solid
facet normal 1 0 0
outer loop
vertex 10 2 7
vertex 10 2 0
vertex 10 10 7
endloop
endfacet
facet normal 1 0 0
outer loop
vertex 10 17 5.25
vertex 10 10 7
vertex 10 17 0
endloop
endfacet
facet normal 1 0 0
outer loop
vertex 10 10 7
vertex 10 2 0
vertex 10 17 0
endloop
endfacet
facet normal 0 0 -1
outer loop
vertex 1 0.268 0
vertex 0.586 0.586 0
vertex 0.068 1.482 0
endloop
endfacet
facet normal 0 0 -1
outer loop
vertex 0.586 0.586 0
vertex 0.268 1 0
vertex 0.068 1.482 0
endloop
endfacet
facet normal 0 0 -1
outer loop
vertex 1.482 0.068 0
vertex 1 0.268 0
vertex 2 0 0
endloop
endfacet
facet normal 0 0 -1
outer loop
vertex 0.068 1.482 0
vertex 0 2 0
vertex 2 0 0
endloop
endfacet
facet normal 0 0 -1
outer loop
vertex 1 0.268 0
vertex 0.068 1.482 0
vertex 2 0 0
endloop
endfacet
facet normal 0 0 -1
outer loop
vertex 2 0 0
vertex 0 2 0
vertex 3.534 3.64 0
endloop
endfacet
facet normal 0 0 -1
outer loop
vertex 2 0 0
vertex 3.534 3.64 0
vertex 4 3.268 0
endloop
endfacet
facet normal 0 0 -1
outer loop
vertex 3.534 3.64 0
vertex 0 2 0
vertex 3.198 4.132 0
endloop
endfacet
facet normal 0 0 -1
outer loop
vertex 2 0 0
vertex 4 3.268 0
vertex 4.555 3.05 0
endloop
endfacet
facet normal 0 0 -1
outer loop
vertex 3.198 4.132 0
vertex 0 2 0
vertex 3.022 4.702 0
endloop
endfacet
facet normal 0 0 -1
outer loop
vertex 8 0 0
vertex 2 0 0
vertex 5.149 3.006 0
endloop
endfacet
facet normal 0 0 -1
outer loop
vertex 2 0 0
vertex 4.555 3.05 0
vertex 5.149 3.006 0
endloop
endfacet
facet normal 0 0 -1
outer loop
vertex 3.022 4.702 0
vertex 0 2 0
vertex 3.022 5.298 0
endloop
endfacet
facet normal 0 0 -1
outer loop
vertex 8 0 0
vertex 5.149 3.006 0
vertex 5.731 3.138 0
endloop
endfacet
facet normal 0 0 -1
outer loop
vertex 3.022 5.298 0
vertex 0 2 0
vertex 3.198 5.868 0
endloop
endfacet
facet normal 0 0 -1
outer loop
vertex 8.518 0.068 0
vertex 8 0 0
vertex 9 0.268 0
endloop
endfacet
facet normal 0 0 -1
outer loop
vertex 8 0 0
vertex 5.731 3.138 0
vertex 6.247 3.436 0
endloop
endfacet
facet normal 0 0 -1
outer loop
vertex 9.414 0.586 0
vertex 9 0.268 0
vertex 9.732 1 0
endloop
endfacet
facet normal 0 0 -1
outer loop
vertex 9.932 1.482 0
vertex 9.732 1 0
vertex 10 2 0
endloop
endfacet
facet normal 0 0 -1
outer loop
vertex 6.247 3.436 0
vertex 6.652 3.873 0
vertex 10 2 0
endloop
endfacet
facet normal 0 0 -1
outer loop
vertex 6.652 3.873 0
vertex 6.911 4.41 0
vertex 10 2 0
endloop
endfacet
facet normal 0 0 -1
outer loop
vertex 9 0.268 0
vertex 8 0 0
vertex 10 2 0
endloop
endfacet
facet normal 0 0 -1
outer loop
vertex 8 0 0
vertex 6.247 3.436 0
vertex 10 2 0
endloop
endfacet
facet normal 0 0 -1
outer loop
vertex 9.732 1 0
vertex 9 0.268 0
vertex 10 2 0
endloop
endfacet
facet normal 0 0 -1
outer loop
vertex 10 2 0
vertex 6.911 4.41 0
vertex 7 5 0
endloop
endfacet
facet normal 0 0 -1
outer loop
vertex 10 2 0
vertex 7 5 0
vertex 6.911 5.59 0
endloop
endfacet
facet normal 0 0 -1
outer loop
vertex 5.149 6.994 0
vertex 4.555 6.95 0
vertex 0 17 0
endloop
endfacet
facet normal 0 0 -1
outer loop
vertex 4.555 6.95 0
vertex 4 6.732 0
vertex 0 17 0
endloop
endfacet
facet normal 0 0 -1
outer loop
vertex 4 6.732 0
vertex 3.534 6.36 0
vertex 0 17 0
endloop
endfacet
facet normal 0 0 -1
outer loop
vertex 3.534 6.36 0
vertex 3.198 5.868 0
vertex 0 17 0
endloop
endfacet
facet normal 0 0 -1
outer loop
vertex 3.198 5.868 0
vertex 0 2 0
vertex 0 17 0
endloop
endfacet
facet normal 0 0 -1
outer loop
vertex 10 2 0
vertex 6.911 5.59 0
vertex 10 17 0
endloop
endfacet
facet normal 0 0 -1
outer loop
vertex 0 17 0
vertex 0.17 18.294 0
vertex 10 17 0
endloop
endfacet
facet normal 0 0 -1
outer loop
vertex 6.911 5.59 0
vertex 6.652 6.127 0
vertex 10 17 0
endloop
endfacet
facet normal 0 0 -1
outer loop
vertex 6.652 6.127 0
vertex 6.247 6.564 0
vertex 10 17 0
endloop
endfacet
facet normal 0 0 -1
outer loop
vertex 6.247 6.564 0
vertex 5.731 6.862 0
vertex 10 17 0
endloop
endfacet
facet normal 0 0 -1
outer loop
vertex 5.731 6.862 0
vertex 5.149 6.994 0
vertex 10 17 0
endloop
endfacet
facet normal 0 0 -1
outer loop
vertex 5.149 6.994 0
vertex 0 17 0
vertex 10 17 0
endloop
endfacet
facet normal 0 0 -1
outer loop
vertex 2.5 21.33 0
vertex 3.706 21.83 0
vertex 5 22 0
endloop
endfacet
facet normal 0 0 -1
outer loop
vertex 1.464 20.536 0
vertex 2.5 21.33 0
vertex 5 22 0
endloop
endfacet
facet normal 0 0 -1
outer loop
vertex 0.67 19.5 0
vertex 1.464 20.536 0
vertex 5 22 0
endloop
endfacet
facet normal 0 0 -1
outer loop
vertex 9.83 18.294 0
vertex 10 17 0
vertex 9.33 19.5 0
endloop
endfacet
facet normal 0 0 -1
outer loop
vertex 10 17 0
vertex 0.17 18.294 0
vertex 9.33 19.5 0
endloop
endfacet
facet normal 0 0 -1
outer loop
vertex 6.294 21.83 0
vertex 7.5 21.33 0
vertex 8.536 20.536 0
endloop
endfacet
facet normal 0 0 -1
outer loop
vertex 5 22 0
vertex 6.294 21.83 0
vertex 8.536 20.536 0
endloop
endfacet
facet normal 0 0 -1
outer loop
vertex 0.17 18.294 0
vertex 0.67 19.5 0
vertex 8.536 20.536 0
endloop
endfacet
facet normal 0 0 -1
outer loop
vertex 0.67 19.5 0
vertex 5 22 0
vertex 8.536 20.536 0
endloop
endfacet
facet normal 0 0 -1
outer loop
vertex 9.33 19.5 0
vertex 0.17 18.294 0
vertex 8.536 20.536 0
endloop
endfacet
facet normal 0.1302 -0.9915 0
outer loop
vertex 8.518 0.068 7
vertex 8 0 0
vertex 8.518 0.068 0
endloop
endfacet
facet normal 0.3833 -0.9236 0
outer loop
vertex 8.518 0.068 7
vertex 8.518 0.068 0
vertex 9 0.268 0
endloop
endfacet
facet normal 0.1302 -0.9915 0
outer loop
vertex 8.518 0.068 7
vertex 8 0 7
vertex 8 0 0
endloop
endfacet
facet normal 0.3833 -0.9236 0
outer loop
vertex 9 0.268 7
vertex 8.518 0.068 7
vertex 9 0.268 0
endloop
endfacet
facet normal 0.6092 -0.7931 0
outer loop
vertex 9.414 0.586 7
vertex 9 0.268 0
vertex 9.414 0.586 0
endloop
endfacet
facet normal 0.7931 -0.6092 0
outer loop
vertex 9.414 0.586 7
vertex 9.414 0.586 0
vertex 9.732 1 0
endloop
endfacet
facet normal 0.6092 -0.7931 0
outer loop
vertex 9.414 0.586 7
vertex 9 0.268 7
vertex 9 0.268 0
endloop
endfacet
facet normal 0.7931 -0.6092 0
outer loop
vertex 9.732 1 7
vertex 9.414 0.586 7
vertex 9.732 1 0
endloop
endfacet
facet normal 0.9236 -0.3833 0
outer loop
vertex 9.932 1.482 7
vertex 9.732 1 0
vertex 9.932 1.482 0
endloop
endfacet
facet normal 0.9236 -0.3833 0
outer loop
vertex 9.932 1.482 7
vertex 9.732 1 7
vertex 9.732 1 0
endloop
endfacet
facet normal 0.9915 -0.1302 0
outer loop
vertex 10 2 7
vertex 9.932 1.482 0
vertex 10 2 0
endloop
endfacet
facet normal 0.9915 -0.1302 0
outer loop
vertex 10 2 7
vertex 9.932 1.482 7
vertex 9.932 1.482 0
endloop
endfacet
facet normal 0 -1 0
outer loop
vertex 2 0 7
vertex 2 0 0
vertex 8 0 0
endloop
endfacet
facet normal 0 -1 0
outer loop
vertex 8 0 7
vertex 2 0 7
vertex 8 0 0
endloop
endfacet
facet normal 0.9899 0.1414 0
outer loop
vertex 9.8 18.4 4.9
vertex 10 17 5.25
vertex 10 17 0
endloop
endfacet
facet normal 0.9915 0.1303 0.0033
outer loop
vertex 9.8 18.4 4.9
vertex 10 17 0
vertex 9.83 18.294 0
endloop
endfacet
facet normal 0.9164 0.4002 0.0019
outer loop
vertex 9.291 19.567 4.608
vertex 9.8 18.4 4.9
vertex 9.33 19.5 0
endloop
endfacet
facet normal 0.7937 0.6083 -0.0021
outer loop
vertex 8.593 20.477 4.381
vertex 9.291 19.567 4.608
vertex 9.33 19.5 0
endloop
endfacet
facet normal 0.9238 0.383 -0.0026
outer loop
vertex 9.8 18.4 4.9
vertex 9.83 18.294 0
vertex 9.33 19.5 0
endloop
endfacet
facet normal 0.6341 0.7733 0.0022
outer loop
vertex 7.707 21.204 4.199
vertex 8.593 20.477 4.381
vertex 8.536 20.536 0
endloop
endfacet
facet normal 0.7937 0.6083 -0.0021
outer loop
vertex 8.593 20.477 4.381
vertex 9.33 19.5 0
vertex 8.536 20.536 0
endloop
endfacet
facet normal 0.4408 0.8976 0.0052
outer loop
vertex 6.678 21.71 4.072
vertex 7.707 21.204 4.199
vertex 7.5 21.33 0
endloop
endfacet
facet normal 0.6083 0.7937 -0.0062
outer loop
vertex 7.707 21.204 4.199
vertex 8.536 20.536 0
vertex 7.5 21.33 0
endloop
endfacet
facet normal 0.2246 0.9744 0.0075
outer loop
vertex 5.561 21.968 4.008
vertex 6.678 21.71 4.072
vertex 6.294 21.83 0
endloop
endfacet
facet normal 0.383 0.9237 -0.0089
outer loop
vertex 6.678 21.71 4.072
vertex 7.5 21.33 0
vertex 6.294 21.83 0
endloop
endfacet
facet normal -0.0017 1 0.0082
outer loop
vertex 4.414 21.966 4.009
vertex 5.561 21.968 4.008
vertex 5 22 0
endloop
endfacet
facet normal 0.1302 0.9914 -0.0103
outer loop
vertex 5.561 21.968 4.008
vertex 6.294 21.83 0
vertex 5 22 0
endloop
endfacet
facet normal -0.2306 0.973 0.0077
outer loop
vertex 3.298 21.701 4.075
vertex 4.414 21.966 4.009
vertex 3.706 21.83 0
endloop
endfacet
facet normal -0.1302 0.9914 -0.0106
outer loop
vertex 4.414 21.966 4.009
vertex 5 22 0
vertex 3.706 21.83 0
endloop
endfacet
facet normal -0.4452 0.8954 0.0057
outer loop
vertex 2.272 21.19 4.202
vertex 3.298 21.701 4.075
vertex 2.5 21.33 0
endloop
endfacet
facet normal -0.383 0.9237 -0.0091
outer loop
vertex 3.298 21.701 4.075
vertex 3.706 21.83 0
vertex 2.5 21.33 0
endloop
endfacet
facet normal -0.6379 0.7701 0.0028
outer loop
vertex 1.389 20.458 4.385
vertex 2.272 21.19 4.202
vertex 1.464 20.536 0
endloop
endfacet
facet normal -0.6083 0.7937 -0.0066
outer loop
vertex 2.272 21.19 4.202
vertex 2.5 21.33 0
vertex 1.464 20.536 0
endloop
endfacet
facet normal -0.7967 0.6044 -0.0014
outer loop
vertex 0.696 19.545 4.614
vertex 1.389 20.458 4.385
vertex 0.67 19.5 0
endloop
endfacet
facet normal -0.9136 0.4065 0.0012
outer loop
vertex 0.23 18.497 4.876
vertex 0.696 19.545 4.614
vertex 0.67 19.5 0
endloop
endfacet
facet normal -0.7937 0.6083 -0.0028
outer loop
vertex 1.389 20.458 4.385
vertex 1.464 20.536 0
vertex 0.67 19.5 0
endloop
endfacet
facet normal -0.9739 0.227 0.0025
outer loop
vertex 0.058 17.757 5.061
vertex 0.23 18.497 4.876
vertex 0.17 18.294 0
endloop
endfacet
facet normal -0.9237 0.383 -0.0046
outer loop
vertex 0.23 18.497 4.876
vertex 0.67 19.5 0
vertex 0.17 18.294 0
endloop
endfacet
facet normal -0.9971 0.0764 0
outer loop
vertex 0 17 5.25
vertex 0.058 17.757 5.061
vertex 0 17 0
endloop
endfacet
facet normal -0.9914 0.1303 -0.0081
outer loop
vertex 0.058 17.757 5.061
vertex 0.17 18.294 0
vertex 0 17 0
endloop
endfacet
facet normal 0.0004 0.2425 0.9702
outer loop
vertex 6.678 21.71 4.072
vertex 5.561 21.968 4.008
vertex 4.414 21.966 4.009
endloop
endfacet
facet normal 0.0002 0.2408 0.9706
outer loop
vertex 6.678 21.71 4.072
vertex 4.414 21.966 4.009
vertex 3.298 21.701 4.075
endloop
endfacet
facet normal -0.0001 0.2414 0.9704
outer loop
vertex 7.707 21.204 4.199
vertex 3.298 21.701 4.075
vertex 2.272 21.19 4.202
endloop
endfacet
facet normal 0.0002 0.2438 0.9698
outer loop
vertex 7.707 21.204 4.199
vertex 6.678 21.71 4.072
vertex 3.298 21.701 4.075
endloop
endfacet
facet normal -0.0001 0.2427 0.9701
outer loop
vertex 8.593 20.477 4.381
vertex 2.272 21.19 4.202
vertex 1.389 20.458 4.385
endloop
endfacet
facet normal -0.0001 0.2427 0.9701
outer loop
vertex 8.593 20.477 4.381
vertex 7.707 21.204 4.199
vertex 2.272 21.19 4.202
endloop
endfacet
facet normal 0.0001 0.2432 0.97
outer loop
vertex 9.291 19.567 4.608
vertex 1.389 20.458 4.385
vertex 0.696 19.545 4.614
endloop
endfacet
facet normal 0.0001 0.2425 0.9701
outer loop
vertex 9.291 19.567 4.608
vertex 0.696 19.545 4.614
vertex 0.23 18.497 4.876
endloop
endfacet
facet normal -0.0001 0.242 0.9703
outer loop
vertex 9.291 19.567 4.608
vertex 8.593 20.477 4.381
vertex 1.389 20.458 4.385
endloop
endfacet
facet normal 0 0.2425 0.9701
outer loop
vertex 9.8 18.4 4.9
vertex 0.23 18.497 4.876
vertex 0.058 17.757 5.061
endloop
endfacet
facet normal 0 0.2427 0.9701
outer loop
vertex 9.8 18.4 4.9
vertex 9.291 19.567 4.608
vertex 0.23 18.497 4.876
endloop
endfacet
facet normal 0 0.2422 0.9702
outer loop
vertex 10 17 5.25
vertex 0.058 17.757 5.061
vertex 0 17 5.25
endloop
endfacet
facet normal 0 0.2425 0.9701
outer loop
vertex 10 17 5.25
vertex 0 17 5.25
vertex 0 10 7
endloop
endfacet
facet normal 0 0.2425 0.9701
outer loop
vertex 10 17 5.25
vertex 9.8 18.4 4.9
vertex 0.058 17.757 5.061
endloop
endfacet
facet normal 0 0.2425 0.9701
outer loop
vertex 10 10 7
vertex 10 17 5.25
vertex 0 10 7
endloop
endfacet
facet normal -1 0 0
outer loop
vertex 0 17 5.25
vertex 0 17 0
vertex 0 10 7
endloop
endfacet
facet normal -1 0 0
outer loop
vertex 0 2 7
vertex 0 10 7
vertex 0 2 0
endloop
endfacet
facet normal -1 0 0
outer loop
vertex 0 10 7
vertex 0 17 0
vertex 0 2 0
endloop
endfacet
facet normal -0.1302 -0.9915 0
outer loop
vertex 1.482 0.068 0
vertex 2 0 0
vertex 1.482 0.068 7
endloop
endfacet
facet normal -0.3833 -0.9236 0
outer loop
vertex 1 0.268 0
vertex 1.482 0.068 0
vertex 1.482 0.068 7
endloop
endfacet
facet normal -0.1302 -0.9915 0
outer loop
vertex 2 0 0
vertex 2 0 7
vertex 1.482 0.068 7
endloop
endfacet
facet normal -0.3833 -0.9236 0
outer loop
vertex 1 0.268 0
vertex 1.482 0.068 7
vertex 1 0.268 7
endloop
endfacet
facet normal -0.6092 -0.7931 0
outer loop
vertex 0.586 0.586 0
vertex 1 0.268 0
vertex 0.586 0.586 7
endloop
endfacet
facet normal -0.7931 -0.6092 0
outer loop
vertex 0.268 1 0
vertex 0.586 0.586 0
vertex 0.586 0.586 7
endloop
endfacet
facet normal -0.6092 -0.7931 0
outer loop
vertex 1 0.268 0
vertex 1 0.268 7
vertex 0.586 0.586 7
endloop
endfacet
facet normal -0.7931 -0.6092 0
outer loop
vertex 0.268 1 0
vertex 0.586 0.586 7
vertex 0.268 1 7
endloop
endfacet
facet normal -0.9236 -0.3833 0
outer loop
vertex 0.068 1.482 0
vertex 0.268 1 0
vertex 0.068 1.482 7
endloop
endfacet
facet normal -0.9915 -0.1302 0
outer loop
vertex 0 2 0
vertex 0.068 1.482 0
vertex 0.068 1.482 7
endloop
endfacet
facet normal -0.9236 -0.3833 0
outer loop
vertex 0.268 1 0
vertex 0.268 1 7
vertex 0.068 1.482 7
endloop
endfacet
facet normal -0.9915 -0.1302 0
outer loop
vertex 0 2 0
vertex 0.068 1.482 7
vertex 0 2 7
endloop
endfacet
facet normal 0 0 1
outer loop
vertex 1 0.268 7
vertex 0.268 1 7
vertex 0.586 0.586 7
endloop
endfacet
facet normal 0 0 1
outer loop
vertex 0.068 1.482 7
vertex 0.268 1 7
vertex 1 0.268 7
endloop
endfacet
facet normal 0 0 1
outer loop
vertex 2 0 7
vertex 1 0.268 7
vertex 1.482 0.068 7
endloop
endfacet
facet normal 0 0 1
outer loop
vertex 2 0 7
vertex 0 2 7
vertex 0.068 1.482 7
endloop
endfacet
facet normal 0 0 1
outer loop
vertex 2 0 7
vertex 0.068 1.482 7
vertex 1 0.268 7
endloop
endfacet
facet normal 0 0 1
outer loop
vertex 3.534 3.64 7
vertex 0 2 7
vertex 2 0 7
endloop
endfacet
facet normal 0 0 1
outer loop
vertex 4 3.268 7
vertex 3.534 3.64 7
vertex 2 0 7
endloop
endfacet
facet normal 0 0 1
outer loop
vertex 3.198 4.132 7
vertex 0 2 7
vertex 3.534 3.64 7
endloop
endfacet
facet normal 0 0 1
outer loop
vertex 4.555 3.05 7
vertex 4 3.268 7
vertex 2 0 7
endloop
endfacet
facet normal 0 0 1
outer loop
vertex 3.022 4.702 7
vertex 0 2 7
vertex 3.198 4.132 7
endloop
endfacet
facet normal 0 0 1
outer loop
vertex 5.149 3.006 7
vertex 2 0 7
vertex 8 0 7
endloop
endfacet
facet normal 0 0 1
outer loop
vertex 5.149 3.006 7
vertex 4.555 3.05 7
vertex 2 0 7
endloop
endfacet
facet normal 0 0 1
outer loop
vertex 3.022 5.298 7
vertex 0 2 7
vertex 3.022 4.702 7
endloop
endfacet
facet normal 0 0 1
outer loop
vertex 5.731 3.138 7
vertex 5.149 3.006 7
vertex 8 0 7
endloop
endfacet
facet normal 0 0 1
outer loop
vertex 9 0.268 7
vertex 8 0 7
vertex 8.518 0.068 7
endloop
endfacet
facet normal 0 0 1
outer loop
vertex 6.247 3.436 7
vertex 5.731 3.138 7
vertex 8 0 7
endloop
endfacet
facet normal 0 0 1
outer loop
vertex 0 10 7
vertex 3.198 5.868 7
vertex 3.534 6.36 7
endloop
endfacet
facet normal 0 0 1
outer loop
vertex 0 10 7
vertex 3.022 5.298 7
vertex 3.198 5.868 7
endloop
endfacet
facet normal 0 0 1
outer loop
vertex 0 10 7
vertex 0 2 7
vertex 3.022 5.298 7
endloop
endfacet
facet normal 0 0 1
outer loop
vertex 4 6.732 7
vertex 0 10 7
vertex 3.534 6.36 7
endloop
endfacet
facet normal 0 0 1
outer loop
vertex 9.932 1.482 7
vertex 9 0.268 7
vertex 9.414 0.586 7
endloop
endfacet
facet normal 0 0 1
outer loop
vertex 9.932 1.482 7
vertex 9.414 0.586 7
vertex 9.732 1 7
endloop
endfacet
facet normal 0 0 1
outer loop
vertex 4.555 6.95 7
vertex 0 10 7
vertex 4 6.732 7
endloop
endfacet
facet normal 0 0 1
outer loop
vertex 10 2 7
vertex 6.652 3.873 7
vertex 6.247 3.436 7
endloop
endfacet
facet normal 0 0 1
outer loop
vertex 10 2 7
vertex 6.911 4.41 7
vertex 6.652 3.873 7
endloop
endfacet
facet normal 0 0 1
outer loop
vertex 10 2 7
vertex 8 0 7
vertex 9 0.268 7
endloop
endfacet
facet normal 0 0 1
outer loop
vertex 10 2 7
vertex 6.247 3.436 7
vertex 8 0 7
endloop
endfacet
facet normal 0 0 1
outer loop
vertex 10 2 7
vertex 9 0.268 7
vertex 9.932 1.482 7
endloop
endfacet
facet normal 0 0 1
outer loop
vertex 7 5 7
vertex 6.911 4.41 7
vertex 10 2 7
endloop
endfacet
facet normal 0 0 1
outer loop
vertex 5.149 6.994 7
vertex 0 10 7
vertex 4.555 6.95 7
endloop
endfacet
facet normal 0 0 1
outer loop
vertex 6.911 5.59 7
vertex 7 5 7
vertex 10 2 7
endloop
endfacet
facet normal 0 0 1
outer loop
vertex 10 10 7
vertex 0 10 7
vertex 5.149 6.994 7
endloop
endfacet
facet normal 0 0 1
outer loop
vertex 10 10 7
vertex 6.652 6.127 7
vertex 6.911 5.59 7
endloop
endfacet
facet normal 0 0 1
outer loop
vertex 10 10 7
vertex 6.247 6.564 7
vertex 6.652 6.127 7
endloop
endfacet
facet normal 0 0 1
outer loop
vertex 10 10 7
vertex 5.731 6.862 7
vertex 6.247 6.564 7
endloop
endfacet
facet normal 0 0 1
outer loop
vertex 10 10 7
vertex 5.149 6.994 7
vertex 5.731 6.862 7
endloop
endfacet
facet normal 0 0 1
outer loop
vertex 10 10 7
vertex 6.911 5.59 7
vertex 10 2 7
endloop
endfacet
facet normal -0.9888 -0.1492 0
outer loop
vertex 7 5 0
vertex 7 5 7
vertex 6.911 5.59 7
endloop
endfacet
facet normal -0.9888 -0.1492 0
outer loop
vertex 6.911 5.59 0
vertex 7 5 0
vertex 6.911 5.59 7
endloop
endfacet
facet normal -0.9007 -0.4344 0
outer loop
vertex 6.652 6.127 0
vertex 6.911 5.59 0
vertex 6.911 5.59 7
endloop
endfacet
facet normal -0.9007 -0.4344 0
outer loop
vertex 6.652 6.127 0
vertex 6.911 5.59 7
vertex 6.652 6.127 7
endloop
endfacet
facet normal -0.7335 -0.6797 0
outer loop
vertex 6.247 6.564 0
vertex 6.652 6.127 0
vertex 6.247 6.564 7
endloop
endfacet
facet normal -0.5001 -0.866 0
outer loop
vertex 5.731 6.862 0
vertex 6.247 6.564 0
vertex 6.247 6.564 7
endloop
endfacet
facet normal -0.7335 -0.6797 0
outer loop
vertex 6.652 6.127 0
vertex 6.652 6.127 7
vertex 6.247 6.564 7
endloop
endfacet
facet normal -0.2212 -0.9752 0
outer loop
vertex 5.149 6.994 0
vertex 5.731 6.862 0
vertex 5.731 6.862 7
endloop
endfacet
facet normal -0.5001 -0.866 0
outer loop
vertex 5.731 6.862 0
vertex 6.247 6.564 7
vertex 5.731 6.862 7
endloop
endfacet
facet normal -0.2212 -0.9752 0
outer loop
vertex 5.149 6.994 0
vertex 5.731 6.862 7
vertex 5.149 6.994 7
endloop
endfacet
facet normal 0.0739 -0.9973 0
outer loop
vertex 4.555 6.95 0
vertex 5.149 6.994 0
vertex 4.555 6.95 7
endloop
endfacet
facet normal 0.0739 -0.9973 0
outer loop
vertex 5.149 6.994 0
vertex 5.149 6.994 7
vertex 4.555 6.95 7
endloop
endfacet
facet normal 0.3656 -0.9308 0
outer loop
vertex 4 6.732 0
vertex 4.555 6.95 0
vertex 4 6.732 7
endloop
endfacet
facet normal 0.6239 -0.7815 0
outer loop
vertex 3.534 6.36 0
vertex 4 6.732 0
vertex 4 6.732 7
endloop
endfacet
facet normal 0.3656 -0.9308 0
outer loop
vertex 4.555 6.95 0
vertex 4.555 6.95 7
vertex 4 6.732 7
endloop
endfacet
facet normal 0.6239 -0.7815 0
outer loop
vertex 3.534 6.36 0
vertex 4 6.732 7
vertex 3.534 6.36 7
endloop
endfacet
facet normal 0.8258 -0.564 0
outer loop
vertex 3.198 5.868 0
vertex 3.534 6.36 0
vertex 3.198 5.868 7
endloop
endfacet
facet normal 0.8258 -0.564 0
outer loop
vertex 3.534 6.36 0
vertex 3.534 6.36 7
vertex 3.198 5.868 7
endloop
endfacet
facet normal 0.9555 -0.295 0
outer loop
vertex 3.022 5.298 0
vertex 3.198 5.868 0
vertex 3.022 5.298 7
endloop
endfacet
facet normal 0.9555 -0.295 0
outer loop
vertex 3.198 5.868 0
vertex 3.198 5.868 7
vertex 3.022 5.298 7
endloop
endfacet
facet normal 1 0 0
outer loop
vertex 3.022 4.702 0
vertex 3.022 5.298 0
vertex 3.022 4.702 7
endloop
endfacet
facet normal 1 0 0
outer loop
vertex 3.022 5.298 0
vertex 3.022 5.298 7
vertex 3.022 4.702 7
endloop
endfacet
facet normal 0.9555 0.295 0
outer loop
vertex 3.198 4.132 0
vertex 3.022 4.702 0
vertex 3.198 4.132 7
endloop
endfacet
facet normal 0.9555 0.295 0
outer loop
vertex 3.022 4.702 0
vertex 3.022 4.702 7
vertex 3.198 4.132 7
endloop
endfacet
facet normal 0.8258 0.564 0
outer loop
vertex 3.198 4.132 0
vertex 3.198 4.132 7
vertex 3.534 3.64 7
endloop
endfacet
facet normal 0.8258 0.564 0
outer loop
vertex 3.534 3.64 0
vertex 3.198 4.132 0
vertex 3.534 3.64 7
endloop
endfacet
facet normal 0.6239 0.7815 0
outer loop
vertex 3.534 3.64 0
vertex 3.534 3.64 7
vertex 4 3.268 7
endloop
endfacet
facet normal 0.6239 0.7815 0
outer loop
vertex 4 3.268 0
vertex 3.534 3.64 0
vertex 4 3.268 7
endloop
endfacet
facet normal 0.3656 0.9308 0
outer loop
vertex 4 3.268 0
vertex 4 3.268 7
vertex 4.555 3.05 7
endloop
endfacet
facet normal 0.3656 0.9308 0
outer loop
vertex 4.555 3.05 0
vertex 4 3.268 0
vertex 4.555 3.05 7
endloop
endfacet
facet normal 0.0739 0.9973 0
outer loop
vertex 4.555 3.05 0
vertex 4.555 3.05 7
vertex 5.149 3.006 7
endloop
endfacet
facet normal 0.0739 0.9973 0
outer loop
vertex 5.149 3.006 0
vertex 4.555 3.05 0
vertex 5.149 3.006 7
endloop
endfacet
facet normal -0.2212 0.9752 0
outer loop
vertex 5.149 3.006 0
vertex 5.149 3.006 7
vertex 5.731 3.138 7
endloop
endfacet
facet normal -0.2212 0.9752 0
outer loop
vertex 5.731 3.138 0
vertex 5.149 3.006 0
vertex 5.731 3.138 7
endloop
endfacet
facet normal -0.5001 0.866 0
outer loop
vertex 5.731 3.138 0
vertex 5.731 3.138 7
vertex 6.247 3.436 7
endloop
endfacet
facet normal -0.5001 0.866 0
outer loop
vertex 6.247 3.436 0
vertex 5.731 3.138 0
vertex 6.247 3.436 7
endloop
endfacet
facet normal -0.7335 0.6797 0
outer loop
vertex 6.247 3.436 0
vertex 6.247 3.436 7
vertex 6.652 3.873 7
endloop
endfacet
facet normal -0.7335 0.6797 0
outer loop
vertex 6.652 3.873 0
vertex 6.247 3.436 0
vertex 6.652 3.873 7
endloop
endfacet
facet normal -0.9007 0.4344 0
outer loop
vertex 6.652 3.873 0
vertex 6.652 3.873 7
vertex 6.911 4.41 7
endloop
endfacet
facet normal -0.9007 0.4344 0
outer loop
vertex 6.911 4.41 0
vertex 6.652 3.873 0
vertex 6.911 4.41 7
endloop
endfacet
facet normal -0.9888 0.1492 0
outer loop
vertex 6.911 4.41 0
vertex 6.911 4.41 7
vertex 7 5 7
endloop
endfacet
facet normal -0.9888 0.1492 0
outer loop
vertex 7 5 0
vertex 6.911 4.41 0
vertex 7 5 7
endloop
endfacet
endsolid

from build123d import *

# Parameters (mm, degrees)
PAD_DEPTH       = 7
POCKET_DEPTH    = 10.001
SKETCH002_R     = 2
POCKET001_DEPTH = 7.001
FILLET_R        = 2


with BuildPart() as part:
    # Sketch → Pad (new body)
    with BuildSketch(Plane.XY):
        with BuildLine():
            Line((0, 0), (10, 0))
            Line((10, 0), (10, 17))
            ThreePointArc((10, 17), (5.000011, 22.000022), (0, 17.000022))
            Line((0, 17.000022), (0, 0))
        make_face()
    extrude(amount=PAD_DEPTH)

    # Sketch001 → Pocket (cut, through all)
    with BuildSketch(Plane.YZ.offset(10)):
        Polygon((10, 8), (23, 8), (23, 3.75), (10, 7), align=None)
    extrude(amount=-POCKET_DEPTH, mode=Mode.SUBTRACT)

    # Sketch002 → Pocket001 (cut, through all)
    with BuildSketch(Plane.XY.offset(7)):
        with Locations((5, 5)):
            Circle(SKETCH002_R)
    extrude(amount=-POCKET001_DEPTH, mode=Mode.SUBTRACT)

    # Fillet
    fillet_edges = [part.edges().sort_by_distance(p)[0] for p in [
        (0, 0, 3.5),
        (10, 0, 3.5),
    ]]
    fillet(fillet_edges, radius=FILLET_R)


solid = part.part
